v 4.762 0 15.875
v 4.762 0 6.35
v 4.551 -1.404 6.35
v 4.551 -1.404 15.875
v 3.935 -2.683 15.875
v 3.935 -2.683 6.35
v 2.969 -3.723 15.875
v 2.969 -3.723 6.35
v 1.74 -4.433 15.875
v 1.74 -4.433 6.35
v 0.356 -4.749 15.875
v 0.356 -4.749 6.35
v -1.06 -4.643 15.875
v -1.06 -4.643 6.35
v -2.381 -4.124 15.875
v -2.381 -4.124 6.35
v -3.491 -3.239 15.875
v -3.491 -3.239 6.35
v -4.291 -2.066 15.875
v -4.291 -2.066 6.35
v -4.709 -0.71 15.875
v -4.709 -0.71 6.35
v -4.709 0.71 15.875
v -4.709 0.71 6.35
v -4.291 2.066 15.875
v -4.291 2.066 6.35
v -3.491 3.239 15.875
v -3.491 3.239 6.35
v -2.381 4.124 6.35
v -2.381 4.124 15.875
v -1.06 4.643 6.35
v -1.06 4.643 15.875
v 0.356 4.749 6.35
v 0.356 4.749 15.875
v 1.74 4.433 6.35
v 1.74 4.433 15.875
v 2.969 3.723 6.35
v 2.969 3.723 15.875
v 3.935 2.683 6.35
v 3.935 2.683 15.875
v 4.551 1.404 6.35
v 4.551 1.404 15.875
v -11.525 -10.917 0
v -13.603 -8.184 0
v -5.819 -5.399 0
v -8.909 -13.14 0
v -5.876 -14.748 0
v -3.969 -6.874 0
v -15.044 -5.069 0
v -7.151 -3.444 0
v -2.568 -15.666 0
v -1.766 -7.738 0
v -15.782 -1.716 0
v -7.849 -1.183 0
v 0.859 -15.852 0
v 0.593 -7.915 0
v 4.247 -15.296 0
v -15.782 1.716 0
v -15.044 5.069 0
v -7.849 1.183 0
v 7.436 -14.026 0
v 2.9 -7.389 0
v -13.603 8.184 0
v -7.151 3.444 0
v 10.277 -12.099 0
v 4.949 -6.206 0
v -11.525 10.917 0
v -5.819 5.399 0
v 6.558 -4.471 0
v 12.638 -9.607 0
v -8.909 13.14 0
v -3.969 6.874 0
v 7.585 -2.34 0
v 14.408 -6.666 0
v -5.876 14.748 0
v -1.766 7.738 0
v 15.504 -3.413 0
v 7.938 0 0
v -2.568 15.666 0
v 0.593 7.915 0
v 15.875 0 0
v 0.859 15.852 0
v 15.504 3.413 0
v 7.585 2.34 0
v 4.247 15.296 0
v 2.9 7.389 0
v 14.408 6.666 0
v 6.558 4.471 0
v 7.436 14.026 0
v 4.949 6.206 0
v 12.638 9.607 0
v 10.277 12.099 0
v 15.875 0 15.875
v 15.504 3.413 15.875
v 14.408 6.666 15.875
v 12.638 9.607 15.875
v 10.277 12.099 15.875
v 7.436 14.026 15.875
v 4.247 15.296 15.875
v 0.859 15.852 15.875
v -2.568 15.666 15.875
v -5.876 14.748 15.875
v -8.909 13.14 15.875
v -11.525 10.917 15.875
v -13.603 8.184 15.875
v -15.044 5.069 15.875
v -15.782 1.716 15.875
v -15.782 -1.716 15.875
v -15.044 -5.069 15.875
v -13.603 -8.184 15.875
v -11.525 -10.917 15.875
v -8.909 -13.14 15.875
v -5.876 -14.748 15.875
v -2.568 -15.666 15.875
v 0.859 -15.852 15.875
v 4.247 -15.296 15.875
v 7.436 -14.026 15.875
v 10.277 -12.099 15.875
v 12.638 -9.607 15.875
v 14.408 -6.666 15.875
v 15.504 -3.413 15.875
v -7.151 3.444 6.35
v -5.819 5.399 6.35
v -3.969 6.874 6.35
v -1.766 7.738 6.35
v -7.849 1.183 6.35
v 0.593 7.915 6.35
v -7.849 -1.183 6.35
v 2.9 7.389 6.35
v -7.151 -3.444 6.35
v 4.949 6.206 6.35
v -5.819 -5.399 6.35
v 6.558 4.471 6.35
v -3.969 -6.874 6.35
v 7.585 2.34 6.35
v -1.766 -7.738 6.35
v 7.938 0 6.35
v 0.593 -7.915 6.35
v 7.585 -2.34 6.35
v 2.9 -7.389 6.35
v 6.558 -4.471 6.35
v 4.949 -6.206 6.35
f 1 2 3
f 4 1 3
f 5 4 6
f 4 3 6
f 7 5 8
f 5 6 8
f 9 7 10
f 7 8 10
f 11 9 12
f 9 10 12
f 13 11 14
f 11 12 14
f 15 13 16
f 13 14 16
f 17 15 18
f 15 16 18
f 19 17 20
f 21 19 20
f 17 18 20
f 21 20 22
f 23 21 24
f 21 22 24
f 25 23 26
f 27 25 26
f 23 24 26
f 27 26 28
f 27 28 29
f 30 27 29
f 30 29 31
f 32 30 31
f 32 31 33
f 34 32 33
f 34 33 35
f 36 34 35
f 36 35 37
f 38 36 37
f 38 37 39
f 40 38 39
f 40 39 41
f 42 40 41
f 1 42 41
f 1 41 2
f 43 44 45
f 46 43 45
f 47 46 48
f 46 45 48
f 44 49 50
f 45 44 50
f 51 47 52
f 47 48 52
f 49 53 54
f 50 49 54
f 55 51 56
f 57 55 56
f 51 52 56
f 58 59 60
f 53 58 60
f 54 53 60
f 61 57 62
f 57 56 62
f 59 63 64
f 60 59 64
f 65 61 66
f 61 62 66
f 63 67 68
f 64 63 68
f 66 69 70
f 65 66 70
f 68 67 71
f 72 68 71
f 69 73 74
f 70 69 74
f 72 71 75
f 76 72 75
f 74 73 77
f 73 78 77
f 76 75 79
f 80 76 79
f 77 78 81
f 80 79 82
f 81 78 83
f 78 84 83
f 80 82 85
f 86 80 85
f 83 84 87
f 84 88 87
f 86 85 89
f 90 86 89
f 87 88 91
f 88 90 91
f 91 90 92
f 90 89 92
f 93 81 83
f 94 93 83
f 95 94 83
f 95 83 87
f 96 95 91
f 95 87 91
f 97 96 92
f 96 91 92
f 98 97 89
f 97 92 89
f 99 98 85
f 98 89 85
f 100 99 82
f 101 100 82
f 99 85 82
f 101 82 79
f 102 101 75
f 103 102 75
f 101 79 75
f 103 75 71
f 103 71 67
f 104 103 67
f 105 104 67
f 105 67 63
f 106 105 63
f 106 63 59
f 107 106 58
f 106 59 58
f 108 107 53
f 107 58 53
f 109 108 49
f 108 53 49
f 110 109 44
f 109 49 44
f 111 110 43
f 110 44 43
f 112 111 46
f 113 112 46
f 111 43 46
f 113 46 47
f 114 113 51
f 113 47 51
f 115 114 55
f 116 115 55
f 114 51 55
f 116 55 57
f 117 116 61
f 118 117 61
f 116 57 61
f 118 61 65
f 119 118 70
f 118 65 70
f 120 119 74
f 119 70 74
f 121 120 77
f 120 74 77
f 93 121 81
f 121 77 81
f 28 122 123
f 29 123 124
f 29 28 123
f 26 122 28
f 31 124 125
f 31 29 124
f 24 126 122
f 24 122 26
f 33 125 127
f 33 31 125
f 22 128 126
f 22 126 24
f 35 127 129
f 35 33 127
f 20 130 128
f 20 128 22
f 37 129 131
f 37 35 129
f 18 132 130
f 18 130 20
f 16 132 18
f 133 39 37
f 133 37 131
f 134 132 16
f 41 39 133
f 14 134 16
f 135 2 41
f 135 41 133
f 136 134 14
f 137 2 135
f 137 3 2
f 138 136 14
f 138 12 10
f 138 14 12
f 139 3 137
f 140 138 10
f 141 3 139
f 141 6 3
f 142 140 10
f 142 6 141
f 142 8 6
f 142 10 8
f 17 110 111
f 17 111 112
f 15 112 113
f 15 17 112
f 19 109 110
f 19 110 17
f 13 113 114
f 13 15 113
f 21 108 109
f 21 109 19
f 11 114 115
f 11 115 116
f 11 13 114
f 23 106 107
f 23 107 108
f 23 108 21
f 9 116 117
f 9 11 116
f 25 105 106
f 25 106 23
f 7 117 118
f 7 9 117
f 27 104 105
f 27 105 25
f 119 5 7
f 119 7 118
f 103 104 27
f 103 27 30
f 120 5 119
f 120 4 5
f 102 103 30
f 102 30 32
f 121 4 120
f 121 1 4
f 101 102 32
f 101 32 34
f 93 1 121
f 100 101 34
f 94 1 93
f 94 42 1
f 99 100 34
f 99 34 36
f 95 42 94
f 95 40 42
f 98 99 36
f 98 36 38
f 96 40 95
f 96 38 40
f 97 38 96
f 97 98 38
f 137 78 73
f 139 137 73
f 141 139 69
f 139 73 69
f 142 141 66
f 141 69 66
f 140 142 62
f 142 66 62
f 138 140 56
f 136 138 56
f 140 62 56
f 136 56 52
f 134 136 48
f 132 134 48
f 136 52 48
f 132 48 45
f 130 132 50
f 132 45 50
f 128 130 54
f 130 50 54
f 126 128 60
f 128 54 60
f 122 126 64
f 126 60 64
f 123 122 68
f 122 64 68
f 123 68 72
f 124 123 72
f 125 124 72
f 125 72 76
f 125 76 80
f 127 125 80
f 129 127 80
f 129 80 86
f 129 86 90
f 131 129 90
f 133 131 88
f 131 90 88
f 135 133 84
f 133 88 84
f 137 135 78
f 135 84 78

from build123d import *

# Parameters (mm, degrees)
F0_R     = 15.875
F0_R_2   = 7.9375
F1_DEPTH = 15.875
F2_R     = 7.9375
F3_DEPTH = 6.35
F4_R     = 4.7625
F5_DEPTH = 25.4


with BuildPart() as f1:
    # F0 (on Top) → F1 (new body)
    with BuildSketch(Plane.XY):
        Circle(F0_R)
        Circle(F0_R_2, mode=Mode.SUBTRACT)
        Circle(F0_R_2)
    extrude(amount=F1_DEPTH)

    # F2 (on face) → F3 (cut)
    with BuildSketch(Plane(origin=(0, 0, 0), x_dir=(1, 0, 0), z_dir=(0, 0, -1))):
        Circle(F2_R)
    extrude(amount=-F3_DEPTH, mode=Mode.SUBTRACT)

    # F4 (on face) → F5 (cut)
    with BuildSketch(Plane(origin=(0, 0, 6.35), x_dir=(1, 0, 0), z_dir=(0, 0, -1))):
        Circle(F4_R)
    extrude(amount=-F5_DEPTH, mode=Mode.SUBTRACT)


solid = f1.part
